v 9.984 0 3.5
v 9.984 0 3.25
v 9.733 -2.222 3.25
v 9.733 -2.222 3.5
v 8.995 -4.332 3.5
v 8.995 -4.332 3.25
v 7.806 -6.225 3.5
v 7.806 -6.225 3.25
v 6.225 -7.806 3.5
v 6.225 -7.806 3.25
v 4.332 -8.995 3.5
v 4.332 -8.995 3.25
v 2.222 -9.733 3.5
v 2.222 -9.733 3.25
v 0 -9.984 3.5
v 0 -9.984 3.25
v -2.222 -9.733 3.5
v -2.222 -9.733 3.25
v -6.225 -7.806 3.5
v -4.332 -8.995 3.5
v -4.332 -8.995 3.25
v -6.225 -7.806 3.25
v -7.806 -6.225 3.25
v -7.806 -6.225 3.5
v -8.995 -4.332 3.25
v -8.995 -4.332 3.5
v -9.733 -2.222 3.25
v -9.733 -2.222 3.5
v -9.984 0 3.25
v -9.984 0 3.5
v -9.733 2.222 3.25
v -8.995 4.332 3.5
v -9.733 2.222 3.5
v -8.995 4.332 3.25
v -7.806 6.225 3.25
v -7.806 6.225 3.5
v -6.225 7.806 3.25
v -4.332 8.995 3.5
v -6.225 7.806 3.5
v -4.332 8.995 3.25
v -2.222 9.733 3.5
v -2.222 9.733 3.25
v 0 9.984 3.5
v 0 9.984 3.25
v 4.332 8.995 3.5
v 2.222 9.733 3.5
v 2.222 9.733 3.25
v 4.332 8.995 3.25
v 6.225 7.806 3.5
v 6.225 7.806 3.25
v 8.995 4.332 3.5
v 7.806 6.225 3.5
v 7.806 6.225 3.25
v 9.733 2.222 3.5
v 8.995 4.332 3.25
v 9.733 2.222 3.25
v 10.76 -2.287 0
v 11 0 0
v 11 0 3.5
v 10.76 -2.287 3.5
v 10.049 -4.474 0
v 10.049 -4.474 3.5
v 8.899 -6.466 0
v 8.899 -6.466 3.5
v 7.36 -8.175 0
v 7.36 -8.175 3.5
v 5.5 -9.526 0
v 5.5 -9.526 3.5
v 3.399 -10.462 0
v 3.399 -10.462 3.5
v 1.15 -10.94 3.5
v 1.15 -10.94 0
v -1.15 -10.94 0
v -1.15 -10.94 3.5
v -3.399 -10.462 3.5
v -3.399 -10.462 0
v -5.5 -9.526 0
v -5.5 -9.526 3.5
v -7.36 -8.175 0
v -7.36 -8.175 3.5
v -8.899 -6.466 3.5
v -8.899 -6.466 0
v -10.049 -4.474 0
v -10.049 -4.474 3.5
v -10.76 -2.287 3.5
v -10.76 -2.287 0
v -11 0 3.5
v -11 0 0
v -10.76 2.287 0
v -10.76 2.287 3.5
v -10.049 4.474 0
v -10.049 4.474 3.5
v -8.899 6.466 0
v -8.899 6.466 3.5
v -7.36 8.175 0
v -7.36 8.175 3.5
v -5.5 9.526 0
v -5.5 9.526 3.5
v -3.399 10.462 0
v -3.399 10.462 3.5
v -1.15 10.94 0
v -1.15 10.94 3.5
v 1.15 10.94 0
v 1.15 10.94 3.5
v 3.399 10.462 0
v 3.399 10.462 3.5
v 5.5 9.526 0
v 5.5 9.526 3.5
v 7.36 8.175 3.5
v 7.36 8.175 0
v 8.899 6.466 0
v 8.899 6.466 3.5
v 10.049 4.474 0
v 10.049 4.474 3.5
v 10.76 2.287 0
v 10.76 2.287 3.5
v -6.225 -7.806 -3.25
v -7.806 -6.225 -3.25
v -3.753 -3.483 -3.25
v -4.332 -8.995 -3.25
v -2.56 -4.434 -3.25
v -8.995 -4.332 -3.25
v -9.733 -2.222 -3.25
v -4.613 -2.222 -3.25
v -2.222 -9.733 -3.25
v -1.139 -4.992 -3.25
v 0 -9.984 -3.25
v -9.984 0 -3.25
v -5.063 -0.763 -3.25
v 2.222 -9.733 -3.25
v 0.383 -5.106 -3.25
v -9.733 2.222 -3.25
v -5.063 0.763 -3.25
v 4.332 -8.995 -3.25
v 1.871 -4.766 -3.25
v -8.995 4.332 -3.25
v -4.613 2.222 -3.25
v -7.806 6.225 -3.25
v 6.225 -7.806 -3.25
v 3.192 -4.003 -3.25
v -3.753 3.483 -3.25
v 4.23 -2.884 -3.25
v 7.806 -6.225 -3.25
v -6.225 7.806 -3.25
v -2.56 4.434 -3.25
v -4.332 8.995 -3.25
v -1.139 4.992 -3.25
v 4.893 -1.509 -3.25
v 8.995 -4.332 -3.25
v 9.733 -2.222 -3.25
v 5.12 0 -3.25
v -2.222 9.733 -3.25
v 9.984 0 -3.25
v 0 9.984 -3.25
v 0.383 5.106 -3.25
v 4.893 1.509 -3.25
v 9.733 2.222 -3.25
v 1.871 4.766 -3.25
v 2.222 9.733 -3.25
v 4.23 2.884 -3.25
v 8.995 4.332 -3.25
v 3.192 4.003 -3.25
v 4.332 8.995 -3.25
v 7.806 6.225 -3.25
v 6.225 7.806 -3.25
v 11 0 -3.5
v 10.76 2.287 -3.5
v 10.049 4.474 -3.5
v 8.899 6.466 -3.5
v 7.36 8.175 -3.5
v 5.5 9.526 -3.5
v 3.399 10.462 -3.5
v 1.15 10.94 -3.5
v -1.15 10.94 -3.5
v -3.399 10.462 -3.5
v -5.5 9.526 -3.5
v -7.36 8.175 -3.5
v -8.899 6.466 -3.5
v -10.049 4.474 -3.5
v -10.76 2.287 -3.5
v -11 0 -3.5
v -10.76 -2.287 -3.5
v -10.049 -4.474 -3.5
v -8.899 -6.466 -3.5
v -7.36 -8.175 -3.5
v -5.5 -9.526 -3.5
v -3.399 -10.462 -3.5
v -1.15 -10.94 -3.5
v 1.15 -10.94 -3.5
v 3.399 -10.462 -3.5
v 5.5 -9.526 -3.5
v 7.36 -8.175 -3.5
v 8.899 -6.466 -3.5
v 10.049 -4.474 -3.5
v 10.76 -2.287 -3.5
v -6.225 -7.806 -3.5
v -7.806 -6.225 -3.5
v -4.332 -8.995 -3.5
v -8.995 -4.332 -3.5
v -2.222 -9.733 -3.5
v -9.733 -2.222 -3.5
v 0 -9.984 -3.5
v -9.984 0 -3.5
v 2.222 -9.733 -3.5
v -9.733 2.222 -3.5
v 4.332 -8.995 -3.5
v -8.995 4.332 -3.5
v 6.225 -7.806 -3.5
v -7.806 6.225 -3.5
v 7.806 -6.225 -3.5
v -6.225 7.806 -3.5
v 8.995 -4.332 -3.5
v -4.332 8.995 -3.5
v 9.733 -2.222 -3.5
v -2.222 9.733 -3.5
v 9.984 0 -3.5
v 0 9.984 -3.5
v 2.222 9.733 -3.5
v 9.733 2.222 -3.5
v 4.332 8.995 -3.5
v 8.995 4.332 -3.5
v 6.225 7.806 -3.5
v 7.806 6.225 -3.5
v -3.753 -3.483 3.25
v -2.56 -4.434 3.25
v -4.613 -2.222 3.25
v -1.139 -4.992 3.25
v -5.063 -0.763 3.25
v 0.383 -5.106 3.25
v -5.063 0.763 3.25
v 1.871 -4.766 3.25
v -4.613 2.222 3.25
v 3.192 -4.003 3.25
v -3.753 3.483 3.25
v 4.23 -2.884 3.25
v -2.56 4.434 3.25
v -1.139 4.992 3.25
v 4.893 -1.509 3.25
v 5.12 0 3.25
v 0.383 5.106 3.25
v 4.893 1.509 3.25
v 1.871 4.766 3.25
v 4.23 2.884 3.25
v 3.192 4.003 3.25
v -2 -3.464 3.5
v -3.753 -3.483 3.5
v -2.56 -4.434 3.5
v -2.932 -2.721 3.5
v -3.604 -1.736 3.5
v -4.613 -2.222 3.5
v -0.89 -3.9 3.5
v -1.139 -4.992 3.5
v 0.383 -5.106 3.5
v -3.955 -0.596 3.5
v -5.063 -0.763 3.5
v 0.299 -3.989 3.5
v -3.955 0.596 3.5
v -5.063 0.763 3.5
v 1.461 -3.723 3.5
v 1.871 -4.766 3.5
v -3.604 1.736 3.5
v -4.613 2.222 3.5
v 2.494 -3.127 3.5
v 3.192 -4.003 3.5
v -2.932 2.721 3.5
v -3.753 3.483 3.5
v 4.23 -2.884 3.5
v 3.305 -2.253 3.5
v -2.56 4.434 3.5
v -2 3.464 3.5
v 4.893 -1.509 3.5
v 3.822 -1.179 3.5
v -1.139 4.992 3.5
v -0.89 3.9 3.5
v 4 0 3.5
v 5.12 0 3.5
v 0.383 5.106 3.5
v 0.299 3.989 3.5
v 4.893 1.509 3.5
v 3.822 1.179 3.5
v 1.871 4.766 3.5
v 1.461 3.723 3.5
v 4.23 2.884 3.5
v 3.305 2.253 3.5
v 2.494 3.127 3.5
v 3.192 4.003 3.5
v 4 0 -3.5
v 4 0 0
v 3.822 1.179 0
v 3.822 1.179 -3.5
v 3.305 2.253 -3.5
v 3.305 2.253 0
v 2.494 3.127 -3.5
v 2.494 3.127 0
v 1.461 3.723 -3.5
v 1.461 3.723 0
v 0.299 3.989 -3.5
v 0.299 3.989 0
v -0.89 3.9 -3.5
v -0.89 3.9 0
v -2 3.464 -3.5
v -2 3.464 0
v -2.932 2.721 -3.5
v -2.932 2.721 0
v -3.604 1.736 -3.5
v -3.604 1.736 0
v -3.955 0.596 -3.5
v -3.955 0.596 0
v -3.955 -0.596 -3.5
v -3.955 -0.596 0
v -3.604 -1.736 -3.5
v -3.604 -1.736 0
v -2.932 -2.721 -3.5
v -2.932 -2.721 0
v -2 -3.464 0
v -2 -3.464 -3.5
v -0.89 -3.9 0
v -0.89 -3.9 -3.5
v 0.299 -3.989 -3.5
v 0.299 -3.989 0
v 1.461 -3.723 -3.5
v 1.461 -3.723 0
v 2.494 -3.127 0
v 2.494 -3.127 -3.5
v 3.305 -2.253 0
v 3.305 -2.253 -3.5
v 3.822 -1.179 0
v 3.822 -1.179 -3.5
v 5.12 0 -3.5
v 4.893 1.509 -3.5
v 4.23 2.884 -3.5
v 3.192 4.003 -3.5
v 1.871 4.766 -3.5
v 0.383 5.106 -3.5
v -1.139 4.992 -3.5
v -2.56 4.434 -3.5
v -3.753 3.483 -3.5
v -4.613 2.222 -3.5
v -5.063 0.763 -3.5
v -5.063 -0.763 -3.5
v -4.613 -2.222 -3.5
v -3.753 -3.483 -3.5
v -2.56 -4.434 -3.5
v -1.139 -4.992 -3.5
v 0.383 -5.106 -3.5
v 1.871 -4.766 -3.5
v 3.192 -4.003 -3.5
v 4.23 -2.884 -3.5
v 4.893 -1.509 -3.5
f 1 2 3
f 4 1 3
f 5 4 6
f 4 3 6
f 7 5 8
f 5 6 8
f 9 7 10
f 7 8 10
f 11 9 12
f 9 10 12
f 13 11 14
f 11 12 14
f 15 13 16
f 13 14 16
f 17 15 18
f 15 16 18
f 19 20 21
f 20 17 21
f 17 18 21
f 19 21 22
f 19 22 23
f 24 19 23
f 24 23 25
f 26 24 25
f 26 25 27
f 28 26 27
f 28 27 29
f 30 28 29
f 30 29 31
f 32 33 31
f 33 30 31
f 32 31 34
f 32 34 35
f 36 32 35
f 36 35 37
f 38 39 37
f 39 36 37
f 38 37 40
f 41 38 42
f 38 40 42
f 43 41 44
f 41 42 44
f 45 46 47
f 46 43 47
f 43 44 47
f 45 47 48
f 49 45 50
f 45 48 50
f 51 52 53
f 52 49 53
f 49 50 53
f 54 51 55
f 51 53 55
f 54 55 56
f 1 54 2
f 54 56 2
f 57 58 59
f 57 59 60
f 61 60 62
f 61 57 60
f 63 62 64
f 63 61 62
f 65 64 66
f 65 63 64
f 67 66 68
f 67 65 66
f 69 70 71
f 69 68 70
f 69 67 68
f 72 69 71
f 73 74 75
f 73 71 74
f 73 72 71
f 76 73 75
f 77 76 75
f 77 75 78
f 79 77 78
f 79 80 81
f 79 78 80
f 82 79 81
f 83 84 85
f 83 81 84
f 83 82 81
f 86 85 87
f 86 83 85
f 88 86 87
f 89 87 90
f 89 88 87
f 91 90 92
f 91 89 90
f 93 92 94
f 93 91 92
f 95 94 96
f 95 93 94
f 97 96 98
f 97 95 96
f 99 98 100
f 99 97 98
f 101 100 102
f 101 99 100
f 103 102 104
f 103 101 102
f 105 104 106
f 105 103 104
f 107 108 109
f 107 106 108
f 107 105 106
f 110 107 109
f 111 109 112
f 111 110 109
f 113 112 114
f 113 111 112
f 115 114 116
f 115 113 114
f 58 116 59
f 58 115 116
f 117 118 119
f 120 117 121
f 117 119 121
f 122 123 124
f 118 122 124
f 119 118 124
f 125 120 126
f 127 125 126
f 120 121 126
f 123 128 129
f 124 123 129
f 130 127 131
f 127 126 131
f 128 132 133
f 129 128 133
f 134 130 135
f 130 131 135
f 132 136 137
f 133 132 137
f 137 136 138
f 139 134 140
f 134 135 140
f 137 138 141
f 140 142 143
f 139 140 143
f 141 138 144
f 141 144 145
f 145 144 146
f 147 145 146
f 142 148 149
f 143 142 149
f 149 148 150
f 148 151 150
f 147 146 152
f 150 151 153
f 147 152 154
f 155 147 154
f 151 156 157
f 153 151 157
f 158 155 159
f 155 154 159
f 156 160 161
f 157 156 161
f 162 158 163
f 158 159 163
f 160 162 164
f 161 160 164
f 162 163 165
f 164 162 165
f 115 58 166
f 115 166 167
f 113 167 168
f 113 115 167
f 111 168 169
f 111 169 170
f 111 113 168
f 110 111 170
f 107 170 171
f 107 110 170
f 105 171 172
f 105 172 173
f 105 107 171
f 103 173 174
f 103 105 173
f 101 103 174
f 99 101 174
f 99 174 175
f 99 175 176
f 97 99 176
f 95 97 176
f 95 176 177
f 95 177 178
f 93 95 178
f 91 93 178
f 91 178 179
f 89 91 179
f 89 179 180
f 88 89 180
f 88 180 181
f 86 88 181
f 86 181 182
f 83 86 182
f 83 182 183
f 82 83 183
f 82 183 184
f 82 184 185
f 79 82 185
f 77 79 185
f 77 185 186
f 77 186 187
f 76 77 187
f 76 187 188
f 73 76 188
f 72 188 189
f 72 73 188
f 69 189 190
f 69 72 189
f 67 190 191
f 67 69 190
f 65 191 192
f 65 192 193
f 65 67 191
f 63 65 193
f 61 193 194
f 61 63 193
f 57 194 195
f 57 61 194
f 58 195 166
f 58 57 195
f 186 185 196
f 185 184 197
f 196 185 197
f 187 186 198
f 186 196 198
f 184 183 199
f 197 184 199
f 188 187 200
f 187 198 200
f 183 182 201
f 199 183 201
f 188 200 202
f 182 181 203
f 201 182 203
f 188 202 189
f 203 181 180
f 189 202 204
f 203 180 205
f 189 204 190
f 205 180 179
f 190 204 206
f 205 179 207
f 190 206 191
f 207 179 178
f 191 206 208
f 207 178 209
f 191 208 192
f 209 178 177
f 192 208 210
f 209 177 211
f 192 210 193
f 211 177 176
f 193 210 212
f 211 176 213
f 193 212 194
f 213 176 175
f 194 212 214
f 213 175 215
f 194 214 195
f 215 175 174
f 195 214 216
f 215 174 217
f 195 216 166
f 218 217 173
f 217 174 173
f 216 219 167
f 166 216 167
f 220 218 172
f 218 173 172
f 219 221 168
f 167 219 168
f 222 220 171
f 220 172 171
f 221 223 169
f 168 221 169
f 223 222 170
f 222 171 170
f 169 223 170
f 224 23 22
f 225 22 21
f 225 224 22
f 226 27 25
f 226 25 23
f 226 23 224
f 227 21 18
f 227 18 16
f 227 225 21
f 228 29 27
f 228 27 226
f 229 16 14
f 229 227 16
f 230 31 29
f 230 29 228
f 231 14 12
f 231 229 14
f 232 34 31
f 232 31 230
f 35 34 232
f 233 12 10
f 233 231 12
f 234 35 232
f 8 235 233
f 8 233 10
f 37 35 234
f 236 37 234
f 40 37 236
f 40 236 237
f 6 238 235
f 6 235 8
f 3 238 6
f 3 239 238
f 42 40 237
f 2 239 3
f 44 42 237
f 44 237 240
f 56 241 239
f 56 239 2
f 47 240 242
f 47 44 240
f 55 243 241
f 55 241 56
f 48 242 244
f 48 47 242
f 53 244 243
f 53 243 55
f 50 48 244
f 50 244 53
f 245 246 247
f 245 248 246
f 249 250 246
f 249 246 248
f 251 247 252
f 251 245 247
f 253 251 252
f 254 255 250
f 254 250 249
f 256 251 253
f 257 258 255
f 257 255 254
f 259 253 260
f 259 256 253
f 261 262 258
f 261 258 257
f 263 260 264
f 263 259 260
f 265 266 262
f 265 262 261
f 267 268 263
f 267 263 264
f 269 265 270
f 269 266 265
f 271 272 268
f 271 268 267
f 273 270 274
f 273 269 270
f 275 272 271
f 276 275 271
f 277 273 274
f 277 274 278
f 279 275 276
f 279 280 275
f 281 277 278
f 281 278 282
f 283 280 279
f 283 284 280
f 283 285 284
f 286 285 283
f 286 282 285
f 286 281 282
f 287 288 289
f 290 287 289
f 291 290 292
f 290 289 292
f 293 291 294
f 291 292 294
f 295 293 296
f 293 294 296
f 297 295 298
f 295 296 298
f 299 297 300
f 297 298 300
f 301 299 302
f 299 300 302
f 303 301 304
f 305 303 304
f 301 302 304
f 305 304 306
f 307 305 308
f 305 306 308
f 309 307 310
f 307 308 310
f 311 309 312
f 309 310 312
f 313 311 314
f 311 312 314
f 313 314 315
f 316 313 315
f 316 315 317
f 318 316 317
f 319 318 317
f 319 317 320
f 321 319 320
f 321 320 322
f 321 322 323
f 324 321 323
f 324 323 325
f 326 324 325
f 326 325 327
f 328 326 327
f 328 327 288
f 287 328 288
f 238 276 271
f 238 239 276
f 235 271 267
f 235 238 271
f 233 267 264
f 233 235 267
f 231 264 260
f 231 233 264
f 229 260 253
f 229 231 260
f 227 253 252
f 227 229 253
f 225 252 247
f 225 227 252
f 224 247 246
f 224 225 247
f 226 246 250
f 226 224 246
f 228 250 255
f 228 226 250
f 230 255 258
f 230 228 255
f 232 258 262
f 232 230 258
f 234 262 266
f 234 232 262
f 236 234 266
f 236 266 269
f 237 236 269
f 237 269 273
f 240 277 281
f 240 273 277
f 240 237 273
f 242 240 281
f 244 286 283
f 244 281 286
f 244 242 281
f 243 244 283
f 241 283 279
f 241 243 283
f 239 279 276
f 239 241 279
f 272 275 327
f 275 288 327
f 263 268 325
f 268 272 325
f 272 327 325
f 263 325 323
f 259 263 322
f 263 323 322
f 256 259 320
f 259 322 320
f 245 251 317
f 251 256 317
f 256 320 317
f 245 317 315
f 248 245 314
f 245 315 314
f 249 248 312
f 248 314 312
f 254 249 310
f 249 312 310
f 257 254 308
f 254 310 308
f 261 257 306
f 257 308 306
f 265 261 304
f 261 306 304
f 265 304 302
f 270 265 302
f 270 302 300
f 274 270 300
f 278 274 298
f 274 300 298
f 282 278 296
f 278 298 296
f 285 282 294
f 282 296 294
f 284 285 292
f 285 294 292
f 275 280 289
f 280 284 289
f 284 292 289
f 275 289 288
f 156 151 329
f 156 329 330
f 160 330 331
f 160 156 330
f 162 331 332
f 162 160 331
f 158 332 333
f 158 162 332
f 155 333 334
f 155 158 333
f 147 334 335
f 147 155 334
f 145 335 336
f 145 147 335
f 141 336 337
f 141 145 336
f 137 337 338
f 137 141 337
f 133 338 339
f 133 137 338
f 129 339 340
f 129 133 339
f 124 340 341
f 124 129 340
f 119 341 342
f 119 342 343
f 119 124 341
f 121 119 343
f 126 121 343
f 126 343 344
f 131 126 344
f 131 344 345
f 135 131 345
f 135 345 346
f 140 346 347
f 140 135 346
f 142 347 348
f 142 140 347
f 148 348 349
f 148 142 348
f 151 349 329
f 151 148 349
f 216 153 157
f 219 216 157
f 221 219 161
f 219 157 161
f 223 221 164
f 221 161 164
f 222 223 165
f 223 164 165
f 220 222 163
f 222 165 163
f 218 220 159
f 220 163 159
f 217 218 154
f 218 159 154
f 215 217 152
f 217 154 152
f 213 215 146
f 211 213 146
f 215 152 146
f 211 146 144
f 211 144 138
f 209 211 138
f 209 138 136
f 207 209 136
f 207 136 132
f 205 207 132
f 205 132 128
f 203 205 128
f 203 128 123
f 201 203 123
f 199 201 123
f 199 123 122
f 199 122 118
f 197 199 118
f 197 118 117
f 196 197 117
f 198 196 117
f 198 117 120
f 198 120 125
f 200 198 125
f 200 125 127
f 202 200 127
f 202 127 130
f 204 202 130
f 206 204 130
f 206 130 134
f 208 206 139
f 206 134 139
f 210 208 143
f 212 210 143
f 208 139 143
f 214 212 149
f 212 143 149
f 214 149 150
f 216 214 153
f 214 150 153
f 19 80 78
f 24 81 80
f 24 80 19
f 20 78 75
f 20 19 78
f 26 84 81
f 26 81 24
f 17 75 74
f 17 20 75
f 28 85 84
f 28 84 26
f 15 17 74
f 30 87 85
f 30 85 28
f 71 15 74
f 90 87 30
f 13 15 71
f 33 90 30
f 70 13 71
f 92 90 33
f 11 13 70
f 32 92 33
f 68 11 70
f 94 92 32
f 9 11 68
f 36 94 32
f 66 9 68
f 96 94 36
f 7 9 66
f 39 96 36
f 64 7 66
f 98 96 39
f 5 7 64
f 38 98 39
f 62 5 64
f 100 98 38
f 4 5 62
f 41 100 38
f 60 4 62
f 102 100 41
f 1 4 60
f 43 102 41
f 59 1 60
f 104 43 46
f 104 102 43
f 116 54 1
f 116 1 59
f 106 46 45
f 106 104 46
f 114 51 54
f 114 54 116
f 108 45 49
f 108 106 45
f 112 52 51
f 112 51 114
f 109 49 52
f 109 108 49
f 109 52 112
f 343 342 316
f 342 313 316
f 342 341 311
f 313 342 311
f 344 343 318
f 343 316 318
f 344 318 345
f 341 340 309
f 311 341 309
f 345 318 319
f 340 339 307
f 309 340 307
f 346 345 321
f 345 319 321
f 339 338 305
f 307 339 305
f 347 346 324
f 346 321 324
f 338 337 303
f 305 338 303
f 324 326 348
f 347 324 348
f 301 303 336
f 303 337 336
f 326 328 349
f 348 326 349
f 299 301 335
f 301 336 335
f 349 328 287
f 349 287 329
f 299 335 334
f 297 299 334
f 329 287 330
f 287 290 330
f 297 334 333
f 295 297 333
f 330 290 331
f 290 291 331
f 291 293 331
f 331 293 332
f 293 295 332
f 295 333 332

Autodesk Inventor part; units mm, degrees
ref_plane "YZ Plane" through (0, 0, 0) normal (1, 0, 0) x (0, 1, 0)
ref_plane "XZ Plane" through (0, 0, 0) normal (0, 1, 0) x (-1, 0, 0)
ref_plane "XY Plane" through (0, 0, 0) normal (0, 0, 1) x (1, 0, 0)
sketch "Sketch1" plane through (0, 0, 0) normal (0, 0, 1) x (1, 0, 0)
  circle A0 centre (0, 0) radius 11
  circle A1 centre (0, 0) radius 4
  circle A2 centre (0, 0) radius 5.1201
  circle A3 centre (0, 0) radius 9.9838
  dimension "d0" = 22
  dimension "d1" = 8
extrude "Extrusion1" add sketch "Sketch1" along normal mid plane 7
extrude "Extrusion2" add sketch "Sketch1" along normal mid plane 6.5 contours A3
properties part number "8mmx22mm bearing"
